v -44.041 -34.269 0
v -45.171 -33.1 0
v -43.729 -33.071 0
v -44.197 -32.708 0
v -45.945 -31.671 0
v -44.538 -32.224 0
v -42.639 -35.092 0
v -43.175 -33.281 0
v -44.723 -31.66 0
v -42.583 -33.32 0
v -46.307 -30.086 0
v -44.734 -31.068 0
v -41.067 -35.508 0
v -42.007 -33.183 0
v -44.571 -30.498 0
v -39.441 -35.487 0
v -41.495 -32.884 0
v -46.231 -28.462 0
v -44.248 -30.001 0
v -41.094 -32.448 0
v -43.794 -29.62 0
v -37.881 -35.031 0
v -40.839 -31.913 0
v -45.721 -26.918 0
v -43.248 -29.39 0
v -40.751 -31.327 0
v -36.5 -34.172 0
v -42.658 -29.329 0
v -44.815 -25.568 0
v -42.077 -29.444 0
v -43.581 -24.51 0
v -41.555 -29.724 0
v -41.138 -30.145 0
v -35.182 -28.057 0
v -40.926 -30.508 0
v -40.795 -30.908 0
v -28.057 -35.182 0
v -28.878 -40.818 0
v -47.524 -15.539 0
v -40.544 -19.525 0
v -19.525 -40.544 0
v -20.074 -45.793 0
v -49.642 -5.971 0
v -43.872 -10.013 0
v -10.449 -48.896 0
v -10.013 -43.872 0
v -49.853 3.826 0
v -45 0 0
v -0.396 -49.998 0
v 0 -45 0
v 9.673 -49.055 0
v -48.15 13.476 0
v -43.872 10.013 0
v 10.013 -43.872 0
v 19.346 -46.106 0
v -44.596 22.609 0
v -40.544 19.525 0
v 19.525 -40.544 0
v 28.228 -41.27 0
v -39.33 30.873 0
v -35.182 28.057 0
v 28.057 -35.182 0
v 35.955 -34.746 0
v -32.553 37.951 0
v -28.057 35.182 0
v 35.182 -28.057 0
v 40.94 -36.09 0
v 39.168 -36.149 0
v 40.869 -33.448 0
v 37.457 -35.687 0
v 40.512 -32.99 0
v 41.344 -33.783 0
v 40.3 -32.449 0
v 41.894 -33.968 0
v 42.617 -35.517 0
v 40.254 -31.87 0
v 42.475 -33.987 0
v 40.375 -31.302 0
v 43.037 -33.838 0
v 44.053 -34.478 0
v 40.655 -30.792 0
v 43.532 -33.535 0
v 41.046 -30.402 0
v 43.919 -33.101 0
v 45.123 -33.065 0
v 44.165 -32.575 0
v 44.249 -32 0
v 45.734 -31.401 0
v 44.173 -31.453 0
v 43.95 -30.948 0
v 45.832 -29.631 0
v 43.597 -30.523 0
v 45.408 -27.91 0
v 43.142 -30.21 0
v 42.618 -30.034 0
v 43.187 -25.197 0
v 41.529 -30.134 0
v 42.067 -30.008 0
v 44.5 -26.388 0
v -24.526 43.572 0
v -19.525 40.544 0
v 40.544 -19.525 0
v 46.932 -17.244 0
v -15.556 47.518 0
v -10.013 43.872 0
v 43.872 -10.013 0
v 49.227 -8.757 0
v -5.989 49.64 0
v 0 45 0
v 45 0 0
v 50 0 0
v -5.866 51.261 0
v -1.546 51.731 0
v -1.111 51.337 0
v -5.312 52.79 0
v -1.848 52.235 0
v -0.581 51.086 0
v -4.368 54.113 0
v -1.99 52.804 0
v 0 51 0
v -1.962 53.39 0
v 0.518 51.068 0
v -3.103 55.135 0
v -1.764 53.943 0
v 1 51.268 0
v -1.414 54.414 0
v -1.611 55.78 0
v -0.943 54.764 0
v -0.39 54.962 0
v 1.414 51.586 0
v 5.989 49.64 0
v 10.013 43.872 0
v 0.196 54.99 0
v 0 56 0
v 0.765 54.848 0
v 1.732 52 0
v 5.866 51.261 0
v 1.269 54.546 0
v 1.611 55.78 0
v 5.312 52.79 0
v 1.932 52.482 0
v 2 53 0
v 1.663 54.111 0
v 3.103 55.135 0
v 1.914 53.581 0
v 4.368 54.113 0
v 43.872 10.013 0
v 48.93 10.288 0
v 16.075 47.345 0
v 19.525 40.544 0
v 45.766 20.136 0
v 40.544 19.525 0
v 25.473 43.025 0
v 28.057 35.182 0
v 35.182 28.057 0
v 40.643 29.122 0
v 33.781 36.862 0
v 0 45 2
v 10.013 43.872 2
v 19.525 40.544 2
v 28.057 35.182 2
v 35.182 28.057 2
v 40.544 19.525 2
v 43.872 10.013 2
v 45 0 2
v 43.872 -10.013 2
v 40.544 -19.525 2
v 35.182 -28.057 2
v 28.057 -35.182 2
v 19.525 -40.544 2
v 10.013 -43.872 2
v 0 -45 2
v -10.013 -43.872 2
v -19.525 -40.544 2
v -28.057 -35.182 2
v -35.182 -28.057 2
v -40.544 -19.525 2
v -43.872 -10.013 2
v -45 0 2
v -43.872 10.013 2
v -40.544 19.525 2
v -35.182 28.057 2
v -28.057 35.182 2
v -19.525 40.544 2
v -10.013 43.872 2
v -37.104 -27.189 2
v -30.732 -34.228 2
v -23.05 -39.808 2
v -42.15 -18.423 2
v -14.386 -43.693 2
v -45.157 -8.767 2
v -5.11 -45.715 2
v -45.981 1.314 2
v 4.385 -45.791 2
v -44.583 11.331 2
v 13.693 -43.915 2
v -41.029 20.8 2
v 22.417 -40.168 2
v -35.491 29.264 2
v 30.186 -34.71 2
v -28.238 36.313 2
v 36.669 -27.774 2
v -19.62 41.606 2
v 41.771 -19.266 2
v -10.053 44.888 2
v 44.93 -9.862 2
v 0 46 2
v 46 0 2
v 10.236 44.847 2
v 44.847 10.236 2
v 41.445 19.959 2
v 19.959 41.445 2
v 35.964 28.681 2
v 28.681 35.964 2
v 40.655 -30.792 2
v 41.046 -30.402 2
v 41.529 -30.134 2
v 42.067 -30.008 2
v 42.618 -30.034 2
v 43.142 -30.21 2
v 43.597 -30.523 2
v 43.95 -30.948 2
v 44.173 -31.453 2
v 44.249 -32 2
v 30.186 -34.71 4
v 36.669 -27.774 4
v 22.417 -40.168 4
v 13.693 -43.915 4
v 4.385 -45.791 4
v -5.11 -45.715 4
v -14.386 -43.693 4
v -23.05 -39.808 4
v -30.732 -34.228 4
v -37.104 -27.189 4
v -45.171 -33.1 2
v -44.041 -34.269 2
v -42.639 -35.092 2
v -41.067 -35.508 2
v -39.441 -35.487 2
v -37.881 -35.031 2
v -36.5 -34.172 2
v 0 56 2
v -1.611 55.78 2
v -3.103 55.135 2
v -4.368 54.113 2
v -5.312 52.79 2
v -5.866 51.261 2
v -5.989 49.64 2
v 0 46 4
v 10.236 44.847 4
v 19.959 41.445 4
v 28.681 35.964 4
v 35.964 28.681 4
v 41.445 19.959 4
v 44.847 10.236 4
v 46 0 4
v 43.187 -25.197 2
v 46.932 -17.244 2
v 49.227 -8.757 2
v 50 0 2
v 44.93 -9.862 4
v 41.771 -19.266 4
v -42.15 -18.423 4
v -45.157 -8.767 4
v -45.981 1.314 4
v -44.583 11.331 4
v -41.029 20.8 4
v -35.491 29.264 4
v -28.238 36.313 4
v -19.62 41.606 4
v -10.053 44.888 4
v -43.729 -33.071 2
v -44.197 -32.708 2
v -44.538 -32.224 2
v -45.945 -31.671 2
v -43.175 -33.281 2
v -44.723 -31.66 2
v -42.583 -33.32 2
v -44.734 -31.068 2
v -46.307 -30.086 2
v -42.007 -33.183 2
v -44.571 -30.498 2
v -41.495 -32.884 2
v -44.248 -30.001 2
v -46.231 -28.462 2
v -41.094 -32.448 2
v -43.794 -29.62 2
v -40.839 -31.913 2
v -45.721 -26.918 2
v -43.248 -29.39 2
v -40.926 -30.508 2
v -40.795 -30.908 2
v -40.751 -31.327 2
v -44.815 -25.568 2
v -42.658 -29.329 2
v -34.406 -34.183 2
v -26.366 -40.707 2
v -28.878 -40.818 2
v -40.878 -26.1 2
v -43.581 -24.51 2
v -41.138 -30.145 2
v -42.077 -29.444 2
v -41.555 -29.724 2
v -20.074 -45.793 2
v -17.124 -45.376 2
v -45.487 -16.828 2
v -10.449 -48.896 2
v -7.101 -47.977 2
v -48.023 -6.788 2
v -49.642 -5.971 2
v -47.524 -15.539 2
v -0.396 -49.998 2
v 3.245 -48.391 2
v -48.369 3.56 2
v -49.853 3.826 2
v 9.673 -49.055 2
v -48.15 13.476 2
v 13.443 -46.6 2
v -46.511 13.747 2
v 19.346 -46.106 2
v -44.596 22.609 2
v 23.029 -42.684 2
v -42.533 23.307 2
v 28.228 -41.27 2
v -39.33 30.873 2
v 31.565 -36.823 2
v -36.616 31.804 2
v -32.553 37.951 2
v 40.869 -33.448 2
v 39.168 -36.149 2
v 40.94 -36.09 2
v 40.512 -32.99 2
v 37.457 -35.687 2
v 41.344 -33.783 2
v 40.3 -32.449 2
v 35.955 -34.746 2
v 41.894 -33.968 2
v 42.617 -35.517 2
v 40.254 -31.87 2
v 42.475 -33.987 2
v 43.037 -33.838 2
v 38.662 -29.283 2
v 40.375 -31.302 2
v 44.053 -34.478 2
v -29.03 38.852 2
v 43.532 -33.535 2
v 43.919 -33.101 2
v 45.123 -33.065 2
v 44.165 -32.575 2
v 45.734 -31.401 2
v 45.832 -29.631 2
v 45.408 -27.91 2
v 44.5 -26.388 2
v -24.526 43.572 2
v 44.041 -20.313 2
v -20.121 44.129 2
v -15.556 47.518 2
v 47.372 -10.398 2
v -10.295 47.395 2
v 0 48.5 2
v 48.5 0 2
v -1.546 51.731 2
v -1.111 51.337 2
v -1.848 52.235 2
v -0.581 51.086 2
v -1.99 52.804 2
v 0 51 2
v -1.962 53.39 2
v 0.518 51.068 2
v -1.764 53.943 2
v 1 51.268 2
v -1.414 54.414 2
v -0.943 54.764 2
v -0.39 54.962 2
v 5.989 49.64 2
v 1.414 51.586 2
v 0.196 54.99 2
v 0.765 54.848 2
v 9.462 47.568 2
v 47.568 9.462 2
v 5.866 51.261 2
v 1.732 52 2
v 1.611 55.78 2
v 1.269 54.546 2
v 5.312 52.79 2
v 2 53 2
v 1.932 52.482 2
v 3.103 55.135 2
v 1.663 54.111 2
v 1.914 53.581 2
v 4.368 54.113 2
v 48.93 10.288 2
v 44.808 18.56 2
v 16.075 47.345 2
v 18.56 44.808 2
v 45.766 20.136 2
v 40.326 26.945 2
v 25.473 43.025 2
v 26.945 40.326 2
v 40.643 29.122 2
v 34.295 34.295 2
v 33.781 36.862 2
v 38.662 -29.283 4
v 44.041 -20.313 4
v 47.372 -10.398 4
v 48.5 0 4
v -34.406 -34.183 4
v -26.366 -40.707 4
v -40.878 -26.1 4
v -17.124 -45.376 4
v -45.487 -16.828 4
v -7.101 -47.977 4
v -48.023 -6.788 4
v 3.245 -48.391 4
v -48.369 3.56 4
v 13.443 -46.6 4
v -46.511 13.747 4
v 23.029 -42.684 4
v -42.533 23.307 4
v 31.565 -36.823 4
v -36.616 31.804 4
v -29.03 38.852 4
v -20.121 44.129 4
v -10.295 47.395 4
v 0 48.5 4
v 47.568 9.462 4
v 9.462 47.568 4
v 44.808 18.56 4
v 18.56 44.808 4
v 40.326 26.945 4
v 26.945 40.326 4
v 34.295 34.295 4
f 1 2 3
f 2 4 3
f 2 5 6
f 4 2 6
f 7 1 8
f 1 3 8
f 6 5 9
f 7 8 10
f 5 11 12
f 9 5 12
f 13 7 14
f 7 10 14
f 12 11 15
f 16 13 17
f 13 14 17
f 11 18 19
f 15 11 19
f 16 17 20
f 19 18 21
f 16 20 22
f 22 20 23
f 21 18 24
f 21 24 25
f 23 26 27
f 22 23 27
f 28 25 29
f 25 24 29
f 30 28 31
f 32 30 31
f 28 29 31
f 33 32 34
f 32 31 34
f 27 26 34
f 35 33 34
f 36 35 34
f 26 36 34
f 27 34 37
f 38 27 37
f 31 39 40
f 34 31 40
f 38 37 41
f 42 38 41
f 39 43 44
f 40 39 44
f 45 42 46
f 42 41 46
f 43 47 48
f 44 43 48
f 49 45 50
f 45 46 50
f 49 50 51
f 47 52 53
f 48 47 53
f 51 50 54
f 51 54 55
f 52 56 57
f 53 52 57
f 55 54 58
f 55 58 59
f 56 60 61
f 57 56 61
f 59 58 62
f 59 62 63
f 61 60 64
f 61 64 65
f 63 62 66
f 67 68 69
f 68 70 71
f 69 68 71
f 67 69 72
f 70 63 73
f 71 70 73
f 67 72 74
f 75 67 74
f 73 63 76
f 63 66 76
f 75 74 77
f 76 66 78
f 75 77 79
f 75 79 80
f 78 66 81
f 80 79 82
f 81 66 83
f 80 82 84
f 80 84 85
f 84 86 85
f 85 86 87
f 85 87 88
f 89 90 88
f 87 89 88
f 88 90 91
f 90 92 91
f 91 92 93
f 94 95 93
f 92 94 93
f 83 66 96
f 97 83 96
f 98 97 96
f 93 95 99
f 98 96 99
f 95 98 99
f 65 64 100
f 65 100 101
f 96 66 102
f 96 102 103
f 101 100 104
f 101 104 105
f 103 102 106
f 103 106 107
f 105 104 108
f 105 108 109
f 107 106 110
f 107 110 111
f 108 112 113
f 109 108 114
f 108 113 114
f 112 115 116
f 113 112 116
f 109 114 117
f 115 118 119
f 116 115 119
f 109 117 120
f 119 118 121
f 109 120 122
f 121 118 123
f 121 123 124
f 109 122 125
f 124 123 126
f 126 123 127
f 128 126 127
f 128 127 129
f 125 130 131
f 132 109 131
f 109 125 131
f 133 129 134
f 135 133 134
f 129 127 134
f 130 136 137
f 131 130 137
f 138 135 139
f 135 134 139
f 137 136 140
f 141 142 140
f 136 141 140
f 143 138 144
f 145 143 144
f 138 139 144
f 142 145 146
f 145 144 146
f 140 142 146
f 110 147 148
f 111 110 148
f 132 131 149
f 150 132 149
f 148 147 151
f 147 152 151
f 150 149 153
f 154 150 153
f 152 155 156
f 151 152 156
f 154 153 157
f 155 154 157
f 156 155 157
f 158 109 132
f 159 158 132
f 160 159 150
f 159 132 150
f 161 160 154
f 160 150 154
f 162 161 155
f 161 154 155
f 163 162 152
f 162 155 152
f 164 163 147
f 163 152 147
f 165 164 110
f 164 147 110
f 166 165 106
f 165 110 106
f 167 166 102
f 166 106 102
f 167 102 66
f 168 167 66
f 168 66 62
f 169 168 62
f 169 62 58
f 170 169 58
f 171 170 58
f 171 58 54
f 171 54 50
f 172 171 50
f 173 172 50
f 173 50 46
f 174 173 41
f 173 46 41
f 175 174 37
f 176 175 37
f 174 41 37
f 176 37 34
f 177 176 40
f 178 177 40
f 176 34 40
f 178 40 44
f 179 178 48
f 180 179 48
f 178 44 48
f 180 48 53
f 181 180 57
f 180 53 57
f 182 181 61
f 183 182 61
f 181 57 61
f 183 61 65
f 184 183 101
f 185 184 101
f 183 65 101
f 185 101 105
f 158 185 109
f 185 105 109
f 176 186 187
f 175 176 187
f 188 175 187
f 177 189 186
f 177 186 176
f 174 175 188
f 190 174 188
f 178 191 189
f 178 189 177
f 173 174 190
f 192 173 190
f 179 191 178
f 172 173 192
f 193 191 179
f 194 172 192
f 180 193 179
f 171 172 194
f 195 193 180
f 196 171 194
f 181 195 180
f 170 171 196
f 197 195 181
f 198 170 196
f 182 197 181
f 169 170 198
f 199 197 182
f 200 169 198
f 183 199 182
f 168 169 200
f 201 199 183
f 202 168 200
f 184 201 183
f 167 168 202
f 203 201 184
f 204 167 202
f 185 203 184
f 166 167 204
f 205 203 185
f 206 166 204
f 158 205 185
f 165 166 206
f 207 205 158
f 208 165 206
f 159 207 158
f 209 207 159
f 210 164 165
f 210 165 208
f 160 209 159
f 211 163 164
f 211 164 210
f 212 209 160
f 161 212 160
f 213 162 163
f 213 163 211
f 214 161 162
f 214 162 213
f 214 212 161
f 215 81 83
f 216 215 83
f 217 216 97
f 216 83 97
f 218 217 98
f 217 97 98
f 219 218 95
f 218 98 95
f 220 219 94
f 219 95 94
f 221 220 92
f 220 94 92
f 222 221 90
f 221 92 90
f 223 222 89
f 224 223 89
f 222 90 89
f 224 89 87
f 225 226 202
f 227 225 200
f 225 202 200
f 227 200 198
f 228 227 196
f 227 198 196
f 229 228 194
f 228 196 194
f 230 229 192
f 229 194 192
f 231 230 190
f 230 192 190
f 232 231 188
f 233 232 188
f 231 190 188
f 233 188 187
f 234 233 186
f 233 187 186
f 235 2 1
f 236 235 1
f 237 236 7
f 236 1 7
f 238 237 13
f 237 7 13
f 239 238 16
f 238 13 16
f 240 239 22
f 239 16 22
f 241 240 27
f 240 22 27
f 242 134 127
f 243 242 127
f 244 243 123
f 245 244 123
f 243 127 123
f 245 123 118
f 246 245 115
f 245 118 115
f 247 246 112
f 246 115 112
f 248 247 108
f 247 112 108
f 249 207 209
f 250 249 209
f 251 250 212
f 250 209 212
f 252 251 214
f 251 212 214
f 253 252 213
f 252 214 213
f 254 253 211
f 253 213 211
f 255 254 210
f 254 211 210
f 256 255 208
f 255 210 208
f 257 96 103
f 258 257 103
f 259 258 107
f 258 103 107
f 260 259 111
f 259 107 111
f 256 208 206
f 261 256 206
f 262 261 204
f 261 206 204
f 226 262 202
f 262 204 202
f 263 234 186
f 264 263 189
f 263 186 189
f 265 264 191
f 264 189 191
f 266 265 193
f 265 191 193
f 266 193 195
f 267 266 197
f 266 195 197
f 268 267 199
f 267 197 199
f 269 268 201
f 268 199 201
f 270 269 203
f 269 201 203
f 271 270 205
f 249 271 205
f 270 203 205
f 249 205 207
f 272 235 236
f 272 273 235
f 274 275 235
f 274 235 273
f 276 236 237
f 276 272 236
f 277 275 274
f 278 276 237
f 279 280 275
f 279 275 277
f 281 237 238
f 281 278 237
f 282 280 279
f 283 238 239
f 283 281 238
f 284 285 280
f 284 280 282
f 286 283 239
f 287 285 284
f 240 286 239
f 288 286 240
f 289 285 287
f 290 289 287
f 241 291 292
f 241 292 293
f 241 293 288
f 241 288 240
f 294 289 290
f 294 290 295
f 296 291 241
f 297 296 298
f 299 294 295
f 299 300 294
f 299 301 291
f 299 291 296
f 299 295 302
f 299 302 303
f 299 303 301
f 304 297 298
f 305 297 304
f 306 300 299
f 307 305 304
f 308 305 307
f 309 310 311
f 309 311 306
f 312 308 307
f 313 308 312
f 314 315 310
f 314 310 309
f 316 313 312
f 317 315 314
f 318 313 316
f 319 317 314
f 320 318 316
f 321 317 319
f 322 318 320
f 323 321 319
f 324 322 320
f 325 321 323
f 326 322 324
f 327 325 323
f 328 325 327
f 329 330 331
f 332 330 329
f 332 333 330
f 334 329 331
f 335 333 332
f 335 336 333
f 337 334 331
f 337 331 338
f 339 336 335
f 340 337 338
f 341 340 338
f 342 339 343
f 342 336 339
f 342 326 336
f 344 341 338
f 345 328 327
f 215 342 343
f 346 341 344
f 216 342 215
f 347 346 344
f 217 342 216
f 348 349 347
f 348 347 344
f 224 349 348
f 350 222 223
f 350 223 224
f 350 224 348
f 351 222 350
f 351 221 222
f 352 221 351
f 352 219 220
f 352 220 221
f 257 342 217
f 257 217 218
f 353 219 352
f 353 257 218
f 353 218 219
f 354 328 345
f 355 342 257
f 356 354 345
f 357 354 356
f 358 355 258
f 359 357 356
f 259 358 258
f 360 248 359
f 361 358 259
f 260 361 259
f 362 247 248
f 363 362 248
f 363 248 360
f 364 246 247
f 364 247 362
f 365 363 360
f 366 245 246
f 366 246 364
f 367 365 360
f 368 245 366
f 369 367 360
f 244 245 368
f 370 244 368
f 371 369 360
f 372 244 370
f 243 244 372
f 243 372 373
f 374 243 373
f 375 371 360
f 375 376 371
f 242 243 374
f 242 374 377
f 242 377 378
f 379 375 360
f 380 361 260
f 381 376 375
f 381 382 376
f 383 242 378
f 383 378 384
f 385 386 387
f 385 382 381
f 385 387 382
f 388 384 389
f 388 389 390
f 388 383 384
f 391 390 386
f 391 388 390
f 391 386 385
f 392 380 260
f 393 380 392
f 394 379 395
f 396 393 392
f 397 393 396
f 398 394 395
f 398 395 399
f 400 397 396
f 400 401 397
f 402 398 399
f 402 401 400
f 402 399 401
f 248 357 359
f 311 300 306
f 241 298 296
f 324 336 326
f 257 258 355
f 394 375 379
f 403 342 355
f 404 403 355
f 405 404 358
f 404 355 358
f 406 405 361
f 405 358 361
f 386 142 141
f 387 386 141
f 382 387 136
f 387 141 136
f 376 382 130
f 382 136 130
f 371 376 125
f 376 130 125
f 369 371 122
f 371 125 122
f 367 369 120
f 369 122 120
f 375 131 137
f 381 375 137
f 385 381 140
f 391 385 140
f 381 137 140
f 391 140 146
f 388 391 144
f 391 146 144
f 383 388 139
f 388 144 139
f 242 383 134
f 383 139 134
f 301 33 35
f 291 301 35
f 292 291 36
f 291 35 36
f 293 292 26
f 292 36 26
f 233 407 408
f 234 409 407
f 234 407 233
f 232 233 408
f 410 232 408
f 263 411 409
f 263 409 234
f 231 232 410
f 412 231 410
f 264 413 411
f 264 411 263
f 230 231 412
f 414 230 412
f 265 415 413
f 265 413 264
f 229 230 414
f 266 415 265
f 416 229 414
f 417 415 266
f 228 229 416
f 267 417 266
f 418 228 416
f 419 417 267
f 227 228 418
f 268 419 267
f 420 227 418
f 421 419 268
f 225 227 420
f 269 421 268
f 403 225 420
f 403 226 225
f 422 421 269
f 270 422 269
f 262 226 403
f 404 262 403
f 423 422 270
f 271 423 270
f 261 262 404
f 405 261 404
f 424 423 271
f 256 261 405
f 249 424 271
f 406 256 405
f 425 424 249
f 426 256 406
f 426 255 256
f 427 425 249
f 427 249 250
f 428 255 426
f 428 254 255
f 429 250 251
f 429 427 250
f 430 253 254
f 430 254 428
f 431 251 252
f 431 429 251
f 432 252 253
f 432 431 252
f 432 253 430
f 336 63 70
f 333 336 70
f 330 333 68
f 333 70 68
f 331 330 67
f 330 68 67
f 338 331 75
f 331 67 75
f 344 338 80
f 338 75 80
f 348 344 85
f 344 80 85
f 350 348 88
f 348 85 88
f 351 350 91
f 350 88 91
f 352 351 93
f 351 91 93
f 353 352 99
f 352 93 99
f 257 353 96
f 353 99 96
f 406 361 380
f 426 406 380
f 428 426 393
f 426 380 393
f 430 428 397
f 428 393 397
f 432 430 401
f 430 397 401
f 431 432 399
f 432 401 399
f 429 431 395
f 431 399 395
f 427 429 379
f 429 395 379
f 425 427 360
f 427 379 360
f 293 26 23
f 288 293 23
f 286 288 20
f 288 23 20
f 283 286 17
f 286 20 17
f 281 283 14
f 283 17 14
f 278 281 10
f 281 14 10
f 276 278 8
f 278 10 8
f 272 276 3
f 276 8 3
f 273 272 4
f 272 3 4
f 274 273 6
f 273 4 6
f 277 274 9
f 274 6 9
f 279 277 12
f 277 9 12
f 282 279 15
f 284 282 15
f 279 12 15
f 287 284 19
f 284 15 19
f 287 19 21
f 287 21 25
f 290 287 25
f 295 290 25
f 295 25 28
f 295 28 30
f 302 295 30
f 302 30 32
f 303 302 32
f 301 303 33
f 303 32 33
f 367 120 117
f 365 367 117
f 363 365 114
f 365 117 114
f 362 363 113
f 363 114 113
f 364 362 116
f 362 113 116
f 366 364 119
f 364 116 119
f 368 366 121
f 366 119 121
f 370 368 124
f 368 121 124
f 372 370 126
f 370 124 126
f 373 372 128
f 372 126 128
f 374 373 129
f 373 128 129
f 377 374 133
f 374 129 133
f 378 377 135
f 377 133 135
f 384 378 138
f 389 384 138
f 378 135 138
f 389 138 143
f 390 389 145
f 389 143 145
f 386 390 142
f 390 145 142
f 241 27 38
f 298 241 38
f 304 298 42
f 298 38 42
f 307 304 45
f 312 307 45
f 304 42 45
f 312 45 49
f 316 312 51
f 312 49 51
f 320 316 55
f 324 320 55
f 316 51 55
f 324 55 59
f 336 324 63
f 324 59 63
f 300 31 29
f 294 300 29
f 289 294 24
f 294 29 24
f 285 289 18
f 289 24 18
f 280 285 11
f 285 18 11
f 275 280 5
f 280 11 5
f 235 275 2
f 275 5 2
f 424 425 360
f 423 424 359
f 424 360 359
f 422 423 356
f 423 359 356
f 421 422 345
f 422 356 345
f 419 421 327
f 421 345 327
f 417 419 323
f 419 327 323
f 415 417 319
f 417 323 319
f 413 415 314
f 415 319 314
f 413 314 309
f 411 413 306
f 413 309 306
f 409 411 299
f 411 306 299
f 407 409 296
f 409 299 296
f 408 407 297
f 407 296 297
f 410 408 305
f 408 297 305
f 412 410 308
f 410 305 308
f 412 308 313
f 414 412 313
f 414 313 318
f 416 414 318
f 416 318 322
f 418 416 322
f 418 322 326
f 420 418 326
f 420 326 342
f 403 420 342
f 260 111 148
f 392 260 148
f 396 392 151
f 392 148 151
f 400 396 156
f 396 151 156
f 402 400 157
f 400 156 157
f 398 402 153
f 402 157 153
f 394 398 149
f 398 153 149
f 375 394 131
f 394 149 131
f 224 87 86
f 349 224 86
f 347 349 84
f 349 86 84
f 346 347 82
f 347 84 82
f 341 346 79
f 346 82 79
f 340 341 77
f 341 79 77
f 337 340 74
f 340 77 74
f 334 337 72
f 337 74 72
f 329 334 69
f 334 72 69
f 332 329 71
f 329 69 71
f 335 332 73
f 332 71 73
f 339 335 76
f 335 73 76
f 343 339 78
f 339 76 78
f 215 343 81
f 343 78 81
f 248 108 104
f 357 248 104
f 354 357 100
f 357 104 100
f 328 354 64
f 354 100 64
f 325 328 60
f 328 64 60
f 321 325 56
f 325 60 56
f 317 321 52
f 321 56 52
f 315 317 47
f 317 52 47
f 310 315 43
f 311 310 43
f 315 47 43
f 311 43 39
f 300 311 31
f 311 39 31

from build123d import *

# Parameters (mm, degrees)
F1_DEPTH = 4
F2_DEPTH = 2


with BuildPart() as f1:
    # F0 (on Top) → F1 (new body)
    with BuildSketch(Plane.XY):
        with BuildLine():
            Line((0, 46), (0, 48.5))
            ThreePointArc((0, 48.5), (-43.2585399295, 21.9305431572), (-39.1209598697, -28.6670629621))
            Line((-39.1209598697, -28.6670629621), (-37.1044155465, -27.1893793042))
            ThreePointArc((-37.1044155465, -27.1893793042), (-41.0287182836, 20.8001027883), (0, 46))
        make_face()
        with BuildLine():
            ThreePointArc((-39.1209598697, -28.6670629621), (-0.384054582, -48.498479379), (38.6620589982, -29.2830188679))
            Line((38.6620589982, -29.2830188679), (36.6691693591, -27.7735849057))
            ThreePointArc((36.6691693591, -27.7735849057), (-0.3642579541, -45.9985577616), (-37.1044155465, -27.1893793042))
            Line((-37.1044155465, -27.1893793042), (-39.1209598697, -28.6670629621))
        make_face()
        with BuildLine():
            ThreePointArc((48.5, 0), (34.2946788875, 34.2946788875), (0, 48.5))
            Line((0, 48.5), (0, 46))
            ThreePointArc((0, 46), (32.5269119346, 32.5269119346), (46, 0))
            ThreePointArc((46, 0), (43.6049411794, -14.6495428168), (36.6691693591, -27.7735849057))
            Line((36.6691693591, -27.7735849057), (38.6620589982, -29.2830188679))
            ThreePointArc((38.6620589982, -29.2830188679), (45.9747749392, -15.445713622), (48.5, 0))
        make_face()
    extrude(amount=F1_DEPTH)

    # F0 (on Top) → F2 (join)
    with BuildSketch(Plane.XY):
        with BuildLine():
            Line((0, 48.5), (0, 50))
            ThreePointArc((-3e-10, 50), (-3.0000000001, 49.9099188539), (-5.9891902625, 49.64))
            ThreePointArc((-5.9891902625, 49.64), (-44.596432917, 22.6088073786), (-43.5805555109, -24.5098996604))
            ThreePointArc((-43.5805555109, -24.5098996604), (-42.0314458226, -27.0805753644), (-40.3308865052, -29.5536731))
            Line((-40.3308864636, -29.5536731568), (-39.1209598697, -28.6670629621))
            ThreePointArc((-39.1209598697, -28.6670629621), (-43.2585399295, 21.9305431572), (0, 48.5))
        make_face()
        with BuildLine():
            Line((0, 45), (0, 46))
            ThreePointArc((0, 46), (-41.0287182836, 20.8001027883), (-37.1044155465, -27.1893793042))
            Line((-37.1044155465, -27.1893793042), (-36.2977978173, -26.5983058411))
            ThreePointArc((-36.2977978173, -26.5983058411), (-40.1367896253, 20.3479266407), (0, 45))
        make_face()
        with BuildLine():
            ThreePointArc((35.9547017982, -34.7456388429), (37.9746633311, -32.5257581755), (39.8577928138, -30.1886792029))
            Line((39.8577927817, -30.1886792453), (38.6620589982, -29.2830188679))
            ThreePointArc((38.6620589982, -29.2830188679), (-0.384054582, -48.498479379), (-39.1209598697, -28.6670629621))
            Line((-39.1209598697, -28.6670629621), (-40.3308864636, -29.5536731568))
            ThreePointArc((-40.3308865052, -29.5536731), (-38.4850050472, -31.9202817425), (-36.5004526513, -34.1718737597))
            ThreePointArc((-36.5004526513, -34.1718737597), (-0.3959325588, -49.9984323495), (35.9547017982, -34.7456388429))
        make_face()
        with BuildLine():
            ThreePointArc((-37.1044155465, -27.1893793042), (-0.3642579541, -45.9985577616), (36.6691693591, -27.7735849057))
            Line((36.6691693591, -27.7735849057), (35.8720135035, -27.1698113208))
            ThreePointArc((35.8720135035, -27.1698113208), (-0.3563393029, -44.9985891146), (-36.2977978173, -26.5983058411))
            Line((-36.2977978173, -26.5983058411), (-37.1044155465, -27.1893793042))
        make_face()
        with BuildLine():
            ThreePointArc((-45.1705928336, -33.1001139433), (-41.0669741282, -35.5083498861), (-36.5004526513, -34.1718737597))
            ThreePointArc((-36.5004526513, -34.1718737597), (-38.4850050472, -31.9202817425), (-40.3308865052, -29.5536731))
            ThreePointArc((-40.3308865052, -29.5536731), (-39.8994627937, -30.3940375655), (-39.7507396514, -31.3268935462))
            ThreePointArc((-39.7507396514, -31.3268935462), (-41.8178836997, -34.1781704134), (-45.1705928336, -33.1001139433))
        make_face()
        with BuildLine():
            ThreePointArc((-39.7507396514, -31.3268935462), (-39.8994627937, -30.3940375655), (-40.3308865052, -29.5536731))
            ThreePointArc((-40.3308865052, -29.5536731), (-44.5239600731, -28.907040382), (-45.1705928336, -33.1001139433))
            ThreePointArc((-45.1705928336, -33.1001139433), (-41.8178836997, -34.1781704134), (-39.7507396514, -31.3268935462))
        make_face()
        with BuildLine():
            ThreePointArc((-40.7507396514, -31.3268935462), (-44.6515908972, -31.948797511), (-41.1375041929, -30.1447466199))
            ThreePointArc((-41.1375041929, -30.1447466199), (-40.8498884057, -30.7049895814), (-40.7507396514, -31.3268935462))
        make_face(mode=Mode.SUBTRACT)
        with BuildLine():
            ThreePointArc((-40.3308865052, -29.5536731), (-42.0314458226, -27.0805753644), (-43.5805555109, -24.5098996604))
            ThreePointArc((-43.5805555109, -24.5098996604), (-46.2306698509, -28.4616310409), (-45.1705928336, -33.1001139433))
            ThreePointArc((-45.1705928336, -33.1001139433), (-44.5239600731, -28.907040382), (-40.3308865052, -29.5536731))
        make_face()
        with BuildLine():
            ThreePointArc((44.640728683, -33.8113197413), (40.4379400794, -34.3914679346), (39.8577928138, -30.1886792029))
            ThreePointArc((39.8577928138, -30.1886792029), (37.9746633311, -32.5257581755), (35.9547017982, -34.7456388429))
            ThreePointArc((35.9547017982, -34.7456388429), (40.4994857112, -36.154266407), (44.640728683, -33.8113197413))
        make_face()
        with BuildLine():
            ThreePointArc((44.640728683, -33.8113197413), (45.774130629, -29.1902071747), (43.1869315491, -25.1970026665))
            ThreePointArc((43.1869315491, -25.1970026665), (41.597304838, -27.7428230397), (39.8577928138, -30.1886792029))
            ThreePointArc((39.8577928138, -30.1886792029), (43.2046653401, -29.1561994968), (45.2492603486, -32))
            ThreePointArc((45.2492603486, -32), (45.0930610627, -32.9554043637), (44.640728683, -33.8113197413))
        make_face()
        with BuildLine():
            ThreePointArc((45.2492603486, -32), (43.2046653401, -29.1561994968), (39.8577928138, -30.1886792029))
            ThreePointArc((39.8577928138, -30.1886792029), (40.4379400794, -34.3914679346), (44.640728683, -33.8113197413))
            ThreePointArc((44.640728683, -33.8113197413), (45.0930610627, -32.9554043637), (45.2492603486, -32))
        make_face()
        with BuildLine():
            ThreePointArc((44.2492603486, -32), (41.6123237043, -33.8958670078), (40.6549486373, -30.7924528302))
            ThreePointArc((40.6549486373, -30.7924528302), (42.8861969928, -30.1041329922), (44.2492603486, -32))
        make_face(mode=Mode.SUBTRACT)
        with BuildLine():
            ThreePointArc((43.1869315491, -25.1970026665), (48.2666892248, -13.050927602), (50, 0))
            ThreePointArc((50, 0), (37.4129624136, 33.1703217265), (5.9891902625, 49.64))
            ThreePointArc((5.9891902625, 49.64), (2.9999999999, 49.9099188539), (-3e-10, 50))
            Line((0, 50), (0, 48.5))
            ThreePointArc((0, 48.5), (34.2946788875, 34.2946788875), (48.5, 0))
            ThreePointArc((48.5, 0), (45.9747749392, -15.445713622), (38.6620589982, -29.2830188679))
            Line((38.6620589982, -29.2830188679), (39.8577927817, -30.1886792453))
            ThreePointArc((39.8577928138, -30.1886792029), (41.597304838, -27.7428230397), (43.1869315491, -25.1970026665))
        make_face()
        with BuildLine():
            ThreePointArc((46, 0), (32.5269119346, 32.5269119346), (0, 46))
            Line((0, 46), (0, 45))
            ThreePointArc((0, 45), (31.8198051534, 31.8198051534), (45, 0))
            ThreePointArc((45, 0), (42.6570076755, -14.3310744947), (35.8720135035, -27.1698113208))
            Line((35.8720135035, -27.1698113208), (36.6691693591, -27.7735849057))
            ThreePointArc((36.6691693591, -27.7735849057), (43.6049411794, -14.6495428168), (46, 0))
        make_face()
        with BuildLine():
            ThreePointArc((0, 56), (-3, 53.0000000001), (-3e-10, 50))
            ThreePointArc((-3e-10, 50), (2.1213203435, 50.8786796564), (3, 53))
            ThreePointArc((3, 53), (2.1213203436, 55.1213203436), (0, 56))
        make_face()
        with BuildLine():
            ThreePointArc((2, 53), (1.4142135624, 51.5857864376), (0, 51))
            ThreePointArc((0, 51), (-1.4142135624, 54.4142135624), (2, 53))
        make_face(mode=Mode.SUBTRACT)
        with BuildLine():
            ThreePointArc((-3e-10, 50), (2.9999999999, 49.9099188539), (5.9891902625, 49.64))
            ThreePointArc((5.9891902625, 49.64), (4.3680659336, 54.1133927602), (0, 56))
            ThreePointArc((0, 56), (2.1213203436, 55.1213203436), (3, 53))
            ThreePointArc((3, 53), (2.1213203435, 50.8786796564), (-3e-10, 50))
        make_face()
        with BuildLine():
            ThreePointArc((-5.9891902625, 49.64), (-3.0000000001, 49.9099188539), (-3e-10, 50))
            ThreePointArc((-3e-10, 50), (-3, 53.0000000001), (0, 56))
            ThreePointArc((0, 56), (-4.3680659336, 54.1133927602), (-5.9891902625, 49.64))
        make_face()
    extrude(amount=F2_DEPTH)


solid = f1.part
